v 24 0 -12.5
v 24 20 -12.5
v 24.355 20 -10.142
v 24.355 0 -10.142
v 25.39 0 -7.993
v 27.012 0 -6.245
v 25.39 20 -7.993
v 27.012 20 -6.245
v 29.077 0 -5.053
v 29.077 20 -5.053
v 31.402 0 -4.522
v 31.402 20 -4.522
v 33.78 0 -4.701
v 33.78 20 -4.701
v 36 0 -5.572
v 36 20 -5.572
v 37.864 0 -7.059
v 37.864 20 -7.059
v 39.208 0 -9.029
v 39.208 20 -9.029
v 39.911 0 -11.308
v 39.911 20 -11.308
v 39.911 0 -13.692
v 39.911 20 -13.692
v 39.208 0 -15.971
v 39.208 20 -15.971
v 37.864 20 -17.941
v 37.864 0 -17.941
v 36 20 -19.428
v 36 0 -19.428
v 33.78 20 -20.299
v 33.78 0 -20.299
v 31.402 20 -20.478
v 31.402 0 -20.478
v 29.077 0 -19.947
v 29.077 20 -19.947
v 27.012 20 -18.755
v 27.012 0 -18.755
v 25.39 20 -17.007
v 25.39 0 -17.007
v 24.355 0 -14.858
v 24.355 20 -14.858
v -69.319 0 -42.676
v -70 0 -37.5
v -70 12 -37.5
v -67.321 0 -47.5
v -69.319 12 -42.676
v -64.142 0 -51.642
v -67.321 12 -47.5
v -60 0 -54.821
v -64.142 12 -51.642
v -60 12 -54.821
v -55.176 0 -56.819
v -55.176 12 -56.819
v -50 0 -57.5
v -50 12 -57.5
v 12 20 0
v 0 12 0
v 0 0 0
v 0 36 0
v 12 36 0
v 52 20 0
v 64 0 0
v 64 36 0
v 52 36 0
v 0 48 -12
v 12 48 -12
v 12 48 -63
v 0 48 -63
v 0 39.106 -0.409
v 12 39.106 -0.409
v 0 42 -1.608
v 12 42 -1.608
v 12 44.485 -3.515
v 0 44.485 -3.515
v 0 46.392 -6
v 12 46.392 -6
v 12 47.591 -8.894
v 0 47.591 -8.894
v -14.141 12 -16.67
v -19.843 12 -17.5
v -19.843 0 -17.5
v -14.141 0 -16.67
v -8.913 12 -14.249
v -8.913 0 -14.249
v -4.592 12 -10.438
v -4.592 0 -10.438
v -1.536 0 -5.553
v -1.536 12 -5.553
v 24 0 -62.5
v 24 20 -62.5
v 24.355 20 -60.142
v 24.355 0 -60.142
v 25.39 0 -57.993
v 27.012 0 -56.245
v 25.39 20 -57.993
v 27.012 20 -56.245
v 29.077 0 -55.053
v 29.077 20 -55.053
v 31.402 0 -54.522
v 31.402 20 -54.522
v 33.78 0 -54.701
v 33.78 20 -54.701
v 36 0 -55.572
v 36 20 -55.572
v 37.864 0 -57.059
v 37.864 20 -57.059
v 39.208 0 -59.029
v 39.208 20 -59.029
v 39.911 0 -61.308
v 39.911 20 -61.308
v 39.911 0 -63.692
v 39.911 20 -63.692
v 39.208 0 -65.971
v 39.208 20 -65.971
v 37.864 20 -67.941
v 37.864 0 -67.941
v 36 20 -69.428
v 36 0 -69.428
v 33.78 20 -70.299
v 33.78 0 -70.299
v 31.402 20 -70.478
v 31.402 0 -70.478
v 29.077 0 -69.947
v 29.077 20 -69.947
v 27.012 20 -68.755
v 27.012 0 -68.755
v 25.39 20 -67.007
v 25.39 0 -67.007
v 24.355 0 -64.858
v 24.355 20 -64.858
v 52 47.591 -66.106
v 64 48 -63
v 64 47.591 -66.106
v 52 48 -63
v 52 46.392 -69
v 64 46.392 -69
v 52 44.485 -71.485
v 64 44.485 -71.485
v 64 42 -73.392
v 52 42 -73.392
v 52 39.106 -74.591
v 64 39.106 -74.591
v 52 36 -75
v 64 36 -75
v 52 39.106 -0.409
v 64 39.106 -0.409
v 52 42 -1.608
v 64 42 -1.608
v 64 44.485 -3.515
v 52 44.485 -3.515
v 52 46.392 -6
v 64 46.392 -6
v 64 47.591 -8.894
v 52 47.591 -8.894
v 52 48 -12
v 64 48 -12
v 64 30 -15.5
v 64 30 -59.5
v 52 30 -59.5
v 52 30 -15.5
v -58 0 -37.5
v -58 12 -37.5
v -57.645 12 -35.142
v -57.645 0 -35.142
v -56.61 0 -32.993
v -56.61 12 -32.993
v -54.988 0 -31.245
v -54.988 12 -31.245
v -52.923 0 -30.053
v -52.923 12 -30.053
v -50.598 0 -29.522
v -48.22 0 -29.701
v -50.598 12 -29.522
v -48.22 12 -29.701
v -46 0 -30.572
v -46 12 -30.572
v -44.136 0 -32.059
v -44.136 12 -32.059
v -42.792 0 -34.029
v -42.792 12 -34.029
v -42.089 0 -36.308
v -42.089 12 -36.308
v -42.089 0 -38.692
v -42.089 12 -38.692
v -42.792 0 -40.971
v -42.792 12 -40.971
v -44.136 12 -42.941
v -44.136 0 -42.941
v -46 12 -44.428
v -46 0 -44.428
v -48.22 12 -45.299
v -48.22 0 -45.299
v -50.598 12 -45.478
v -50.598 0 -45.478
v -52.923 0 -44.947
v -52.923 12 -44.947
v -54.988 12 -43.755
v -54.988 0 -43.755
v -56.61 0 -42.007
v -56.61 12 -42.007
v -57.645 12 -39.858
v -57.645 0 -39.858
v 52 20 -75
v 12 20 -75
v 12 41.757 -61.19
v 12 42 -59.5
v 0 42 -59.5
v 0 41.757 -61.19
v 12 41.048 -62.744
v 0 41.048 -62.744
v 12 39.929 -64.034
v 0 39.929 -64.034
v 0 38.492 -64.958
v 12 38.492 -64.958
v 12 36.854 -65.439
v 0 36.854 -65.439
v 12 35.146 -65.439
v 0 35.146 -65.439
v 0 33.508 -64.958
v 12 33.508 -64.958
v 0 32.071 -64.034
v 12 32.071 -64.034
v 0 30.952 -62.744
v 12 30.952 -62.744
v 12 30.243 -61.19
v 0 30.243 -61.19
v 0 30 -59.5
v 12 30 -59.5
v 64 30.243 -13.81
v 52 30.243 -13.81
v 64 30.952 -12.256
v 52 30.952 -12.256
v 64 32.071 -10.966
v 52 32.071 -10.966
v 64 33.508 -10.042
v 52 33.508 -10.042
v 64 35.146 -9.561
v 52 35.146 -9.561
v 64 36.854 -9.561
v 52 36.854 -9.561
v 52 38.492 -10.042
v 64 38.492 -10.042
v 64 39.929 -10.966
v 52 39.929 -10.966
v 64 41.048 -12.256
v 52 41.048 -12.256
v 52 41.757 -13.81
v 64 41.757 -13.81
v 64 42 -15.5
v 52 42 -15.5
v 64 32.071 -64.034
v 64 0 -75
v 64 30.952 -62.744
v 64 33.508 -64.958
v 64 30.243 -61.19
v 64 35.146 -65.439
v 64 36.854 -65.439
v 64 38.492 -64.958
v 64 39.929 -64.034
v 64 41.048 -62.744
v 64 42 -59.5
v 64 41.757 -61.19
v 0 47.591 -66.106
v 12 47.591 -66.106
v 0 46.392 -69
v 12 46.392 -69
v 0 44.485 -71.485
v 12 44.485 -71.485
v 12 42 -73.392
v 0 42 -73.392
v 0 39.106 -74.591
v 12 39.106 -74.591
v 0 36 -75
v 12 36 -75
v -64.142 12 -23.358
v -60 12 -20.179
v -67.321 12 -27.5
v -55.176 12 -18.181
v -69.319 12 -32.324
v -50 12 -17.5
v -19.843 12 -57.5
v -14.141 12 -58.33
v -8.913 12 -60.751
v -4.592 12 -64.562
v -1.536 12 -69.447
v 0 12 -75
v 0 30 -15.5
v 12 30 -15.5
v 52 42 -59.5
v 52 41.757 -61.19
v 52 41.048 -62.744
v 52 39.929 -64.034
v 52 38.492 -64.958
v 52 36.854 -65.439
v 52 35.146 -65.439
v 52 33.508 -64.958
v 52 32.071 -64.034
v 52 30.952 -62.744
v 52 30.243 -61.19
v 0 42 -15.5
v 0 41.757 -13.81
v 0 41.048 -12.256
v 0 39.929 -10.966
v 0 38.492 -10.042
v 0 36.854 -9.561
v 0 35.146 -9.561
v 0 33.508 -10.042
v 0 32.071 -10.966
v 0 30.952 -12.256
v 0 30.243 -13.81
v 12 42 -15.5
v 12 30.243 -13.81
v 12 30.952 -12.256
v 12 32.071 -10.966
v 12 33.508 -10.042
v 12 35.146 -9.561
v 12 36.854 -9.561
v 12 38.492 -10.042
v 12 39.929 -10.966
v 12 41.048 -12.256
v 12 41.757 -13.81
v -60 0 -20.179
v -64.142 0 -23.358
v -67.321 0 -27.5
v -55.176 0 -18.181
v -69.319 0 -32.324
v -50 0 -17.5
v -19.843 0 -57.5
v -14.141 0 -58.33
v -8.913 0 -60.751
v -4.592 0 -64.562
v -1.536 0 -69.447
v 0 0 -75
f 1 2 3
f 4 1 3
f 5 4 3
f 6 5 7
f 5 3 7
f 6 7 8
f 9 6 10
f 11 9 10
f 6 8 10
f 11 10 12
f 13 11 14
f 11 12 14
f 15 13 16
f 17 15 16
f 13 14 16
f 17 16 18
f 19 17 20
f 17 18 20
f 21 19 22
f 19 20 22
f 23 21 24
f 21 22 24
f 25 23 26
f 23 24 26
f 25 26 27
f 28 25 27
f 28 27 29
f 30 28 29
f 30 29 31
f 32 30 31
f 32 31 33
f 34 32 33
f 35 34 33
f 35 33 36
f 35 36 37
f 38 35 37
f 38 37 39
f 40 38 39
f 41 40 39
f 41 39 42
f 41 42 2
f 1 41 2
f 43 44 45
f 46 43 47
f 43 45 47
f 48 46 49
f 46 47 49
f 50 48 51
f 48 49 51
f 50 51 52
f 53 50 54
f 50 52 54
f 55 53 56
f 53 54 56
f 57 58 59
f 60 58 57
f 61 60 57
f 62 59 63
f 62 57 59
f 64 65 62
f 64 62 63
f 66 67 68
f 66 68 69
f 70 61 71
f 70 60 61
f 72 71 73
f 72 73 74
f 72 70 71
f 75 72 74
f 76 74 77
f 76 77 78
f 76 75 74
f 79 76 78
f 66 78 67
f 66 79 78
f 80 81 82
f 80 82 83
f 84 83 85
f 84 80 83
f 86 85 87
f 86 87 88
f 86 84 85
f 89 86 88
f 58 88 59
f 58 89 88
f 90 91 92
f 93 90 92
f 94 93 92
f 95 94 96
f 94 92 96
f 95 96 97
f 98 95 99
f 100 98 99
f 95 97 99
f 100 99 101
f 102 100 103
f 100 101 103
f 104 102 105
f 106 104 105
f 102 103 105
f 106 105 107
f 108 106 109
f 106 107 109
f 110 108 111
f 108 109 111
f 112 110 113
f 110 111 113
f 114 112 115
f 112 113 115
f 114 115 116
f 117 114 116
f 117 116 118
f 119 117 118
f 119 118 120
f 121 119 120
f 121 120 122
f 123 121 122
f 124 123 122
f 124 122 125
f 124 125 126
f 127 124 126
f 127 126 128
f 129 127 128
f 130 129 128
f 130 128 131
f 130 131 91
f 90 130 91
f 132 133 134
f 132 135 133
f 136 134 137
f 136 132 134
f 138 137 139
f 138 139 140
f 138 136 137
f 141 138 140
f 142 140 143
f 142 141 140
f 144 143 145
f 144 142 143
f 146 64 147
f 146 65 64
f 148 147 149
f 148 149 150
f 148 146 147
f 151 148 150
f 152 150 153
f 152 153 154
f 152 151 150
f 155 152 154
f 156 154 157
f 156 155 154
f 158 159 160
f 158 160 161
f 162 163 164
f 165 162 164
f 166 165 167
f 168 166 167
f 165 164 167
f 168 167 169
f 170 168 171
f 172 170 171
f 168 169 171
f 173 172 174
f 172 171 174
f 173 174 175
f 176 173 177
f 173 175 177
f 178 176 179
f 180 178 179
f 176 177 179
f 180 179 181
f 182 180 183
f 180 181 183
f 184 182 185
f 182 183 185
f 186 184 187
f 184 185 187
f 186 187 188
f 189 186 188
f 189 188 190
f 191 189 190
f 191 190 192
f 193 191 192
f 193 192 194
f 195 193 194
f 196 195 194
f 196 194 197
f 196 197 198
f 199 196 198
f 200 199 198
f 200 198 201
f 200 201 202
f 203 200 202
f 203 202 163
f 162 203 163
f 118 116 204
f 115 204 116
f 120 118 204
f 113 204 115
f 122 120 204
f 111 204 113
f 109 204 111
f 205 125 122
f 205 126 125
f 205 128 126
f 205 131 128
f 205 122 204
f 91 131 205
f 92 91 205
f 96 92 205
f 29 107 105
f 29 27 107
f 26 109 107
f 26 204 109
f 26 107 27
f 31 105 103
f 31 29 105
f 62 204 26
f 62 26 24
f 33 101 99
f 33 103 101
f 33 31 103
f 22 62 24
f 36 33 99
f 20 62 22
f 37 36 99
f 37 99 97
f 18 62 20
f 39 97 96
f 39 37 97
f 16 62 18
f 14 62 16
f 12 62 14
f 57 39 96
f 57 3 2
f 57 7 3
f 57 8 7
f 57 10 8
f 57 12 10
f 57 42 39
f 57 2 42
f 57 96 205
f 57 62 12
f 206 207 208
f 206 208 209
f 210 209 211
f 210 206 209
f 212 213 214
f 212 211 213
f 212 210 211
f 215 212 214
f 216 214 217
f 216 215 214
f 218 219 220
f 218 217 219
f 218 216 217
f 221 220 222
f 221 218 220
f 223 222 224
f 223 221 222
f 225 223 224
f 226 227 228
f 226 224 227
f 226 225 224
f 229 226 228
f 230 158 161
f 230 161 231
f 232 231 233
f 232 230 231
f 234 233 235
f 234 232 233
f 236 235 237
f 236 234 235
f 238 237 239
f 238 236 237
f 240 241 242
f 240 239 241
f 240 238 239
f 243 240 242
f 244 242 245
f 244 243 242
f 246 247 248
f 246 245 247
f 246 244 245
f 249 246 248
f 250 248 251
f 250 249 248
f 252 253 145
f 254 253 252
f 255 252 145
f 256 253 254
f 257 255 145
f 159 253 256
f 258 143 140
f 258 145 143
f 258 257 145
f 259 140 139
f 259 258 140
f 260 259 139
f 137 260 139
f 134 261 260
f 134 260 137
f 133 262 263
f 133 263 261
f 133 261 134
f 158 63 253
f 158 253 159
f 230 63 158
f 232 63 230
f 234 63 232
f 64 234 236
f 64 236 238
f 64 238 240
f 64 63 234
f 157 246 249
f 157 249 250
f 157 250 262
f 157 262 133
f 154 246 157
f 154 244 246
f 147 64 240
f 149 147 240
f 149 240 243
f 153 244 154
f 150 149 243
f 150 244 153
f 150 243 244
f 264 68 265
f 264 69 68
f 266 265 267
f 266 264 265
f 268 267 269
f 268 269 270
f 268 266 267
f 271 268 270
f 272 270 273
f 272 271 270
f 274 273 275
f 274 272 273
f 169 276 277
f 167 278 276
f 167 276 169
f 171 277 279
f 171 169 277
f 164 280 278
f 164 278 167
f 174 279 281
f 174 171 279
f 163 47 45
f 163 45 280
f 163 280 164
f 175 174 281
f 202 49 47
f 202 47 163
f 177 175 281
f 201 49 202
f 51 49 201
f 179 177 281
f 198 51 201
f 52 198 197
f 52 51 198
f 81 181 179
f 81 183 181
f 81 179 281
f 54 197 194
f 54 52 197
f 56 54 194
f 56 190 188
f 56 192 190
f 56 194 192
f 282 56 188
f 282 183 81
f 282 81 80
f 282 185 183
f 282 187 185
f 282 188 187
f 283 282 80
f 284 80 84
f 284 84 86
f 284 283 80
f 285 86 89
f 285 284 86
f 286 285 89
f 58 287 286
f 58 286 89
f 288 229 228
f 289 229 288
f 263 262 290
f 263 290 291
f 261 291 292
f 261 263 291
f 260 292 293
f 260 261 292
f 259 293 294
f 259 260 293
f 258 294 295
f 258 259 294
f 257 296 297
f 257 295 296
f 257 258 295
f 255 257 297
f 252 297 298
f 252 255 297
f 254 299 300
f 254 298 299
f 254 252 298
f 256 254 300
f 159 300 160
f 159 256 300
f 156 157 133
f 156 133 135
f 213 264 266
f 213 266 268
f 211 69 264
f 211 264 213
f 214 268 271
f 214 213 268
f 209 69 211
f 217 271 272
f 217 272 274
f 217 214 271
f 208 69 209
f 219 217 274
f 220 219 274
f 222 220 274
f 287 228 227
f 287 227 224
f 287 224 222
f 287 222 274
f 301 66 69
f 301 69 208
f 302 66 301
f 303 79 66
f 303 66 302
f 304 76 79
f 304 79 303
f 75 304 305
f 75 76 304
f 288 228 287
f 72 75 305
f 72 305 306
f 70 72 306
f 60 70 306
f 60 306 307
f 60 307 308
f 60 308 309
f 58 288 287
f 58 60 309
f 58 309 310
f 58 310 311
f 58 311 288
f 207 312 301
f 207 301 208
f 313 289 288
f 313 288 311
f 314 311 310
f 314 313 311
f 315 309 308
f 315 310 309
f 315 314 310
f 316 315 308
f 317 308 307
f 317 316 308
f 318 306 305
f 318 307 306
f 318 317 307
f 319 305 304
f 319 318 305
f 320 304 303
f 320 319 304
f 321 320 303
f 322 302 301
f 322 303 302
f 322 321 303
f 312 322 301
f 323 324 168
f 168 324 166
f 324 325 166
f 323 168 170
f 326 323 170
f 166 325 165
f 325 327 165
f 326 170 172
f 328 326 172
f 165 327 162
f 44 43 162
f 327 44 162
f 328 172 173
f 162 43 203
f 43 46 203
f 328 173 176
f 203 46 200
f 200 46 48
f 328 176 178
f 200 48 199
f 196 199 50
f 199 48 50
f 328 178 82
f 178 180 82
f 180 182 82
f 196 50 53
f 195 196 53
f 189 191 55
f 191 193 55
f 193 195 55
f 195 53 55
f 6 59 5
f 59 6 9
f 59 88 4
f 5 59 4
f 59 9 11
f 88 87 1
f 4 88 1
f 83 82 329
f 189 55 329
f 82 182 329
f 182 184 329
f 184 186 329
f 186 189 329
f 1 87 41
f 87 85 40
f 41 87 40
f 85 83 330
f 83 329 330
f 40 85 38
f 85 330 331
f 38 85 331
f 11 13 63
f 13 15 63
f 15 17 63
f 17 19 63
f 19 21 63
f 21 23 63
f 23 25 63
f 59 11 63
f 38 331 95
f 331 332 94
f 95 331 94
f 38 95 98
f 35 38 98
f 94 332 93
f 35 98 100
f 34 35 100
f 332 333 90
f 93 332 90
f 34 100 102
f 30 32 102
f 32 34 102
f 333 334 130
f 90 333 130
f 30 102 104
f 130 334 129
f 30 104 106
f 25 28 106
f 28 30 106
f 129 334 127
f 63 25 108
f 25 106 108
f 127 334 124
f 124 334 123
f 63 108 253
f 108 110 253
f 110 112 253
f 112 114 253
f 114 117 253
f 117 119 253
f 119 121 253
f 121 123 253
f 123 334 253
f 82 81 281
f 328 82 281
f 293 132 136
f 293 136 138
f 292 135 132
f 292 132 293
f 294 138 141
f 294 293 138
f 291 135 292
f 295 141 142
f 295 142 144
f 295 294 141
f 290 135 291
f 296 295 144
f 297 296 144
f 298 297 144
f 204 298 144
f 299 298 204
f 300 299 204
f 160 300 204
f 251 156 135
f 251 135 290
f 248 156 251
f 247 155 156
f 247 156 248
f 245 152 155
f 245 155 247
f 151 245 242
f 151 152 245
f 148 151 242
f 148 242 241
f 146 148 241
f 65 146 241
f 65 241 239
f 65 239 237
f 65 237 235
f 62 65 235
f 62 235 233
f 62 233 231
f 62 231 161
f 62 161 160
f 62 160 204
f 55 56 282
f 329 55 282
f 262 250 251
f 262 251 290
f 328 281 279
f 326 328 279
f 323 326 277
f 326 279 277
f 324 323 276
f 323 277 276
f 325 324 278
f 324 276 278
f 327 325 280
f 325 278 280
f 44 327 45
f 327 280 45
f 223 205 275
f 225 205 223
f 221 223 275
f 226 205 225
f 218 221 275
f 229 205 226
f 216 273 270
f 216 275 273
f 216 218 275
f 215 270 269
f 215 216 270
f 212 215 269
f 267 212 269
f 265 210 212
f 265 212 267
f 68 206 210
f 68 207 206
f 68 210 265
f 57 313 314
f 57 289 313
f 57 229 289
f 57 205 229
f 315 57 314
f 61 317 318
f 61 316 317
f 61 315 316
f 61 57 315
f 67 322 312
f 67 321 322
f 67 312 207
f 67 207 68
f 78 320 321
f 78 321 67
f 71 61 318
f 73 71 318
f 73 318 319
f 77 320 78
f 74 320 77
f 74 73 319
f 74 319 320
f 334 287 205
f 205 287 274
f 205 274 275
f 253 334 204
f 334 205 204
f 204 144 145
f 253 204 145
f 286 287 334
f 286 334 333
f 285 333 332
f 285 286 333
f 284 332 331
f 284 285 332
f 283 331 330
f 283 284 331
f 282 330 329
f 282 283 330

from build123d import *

# Parameters (mm, degrees)
SKETCH2_W           = 70
SKETCH2_H           = 12
BOSS_EXTRUDE2_DEPTH = 75
CUT_EXTRUDE2_DEPTH  = 75
FILLET2_R           = 20
SKETCH11_R          = 8
CUT_EXTRUDE9_DEPTH  = 20
SKETCH13_R          = 8
CUT_EXTRUDE10_DEPTH = 107.343782141
CUT_EXTRUDE11_DEPTH = 161.888159912
FILLET3_R           = 12


with BuildPart() as part:
    # Sketch2 → Boss-Extrude2 (new body)
    with BuildSketch(Plane.XY):
        Polygon((12, 48), (0, 48), (0, 0), (64, 0), (64, 48), (52, 48), (52, 20), (12, 20), align=None)
        with Locations((-35, 6)):
            Rectangle(SKETCH2_W, SKETCH2_H)
    extrude(amount=-BOSS_EXTRUDE2_DEPTH)

    # Sketch4 → Cut-Extrude2 (cut)
    with BuildSketch(Plane(origin=(0, 12, 0), x_dir=(1, 0, 0), z_dir=(0, 1, 0))):
        with BuildLine():
            ThreePointArc((-70, 37.5), (-64.142135624, 51.642135624), (-50, 57.5))
            Line((-50, 57.5), (0, 57.5))
            Line((0, 57.5), (0, 75))
            Line((0, 75), (-70, 75))
            Line((-70, 75), (-70, 37.5))
        make_face()
        with BuildLine():
            ThreePointArc((-50, 17.5), (-64.142135624, 23.357864376), (-70, 37.5))
            Line((-70, 37.5), (-70, 0))
            Line((-70, 0), (0, 0))
            Line((0, 0), (0, 17.5))
            Line((0, 17.5), (-50, 17.5))
        make_face()
    extrude(amount=-CUT_EXTRUDE2_DEPTH, mode=Mode.SUBTRACT)

    # Fillet2
    # the kernel refuses this fillet: 20 mm, written as the material it adds along each edge
    with BuildSketch(Plane(origin=(0, 12, -57.5), x_dir=(-1, 0, 0), z_dir=(0, -1, 0))) as fillet2_piece_1:
        with BuildLine():
            CenterArc((19.843134833, 20), FILLET2_R, 187.180755781, 82.819244219)
            Line((0, 17.5), (-0.396862697, 17.45))
            ThreePointArc((-0.396862697, 17.45), (-0.4, 8.75), (-0.4, 0))
            Line((-0.4, 0), (0, -0.4))
            Line((0, -0.4), (19.843134833, -0.4))
            Line((19.843134833, -0.4), (19.843134833, 0))
        make_face()
    extrude(amount=12)
    with BuildSketch(Plane(origin=(0, 12, -17.5), x_dir=(-1, 0, 0), z_dir=(0, -1, 0))) as fillet2_piece_2:
        with BuildLine():
            CenterArc((19.843134833, -20), FILLET2_R, 90, 82.819244219)
            Line((0, -17.5), (-0.396862697, -17.45))
            ThreePointArc((-0.396862697, -17.45), (-0.4, -8.75), (-0.4, 0))
            Line((-0.4, 0), (0, 0.4))
            Line((0, 0.4), (19.843134833, 0.4))
            Line((19.843134833, 0.4), (19.843134833, 0))
        make_face()
    extrude(amount=12)

    # Sketch11 → Cut-Extrude9 (cut)
    with BuildSketch(Plane(origin=(0, 12, 0), x_dir=(1, 0, 0), z_dir=(0, 1, 0))):
        with Locations(Location((-50, 37.5, 0), (0, 0, 180))):
            Circle(SKETCH11_R)
    extrude(amount=-CUT_EXTRUDE9_DEPTH, mode=Mode.SUBTRACT)

    # Sketch13 → Cut-Extrude10 (cut, through all)
    with BuildSketch(Plane(origin=(0, 20, 0), x_dir=(1, 0, 0), z_dir=(0, 1, 0))):
        with Locations(Location((32, 62.5, 0), (0, 0, 180))):
            Circle(SKETCH13_R)
        with Locations(Location((32, 12.5, 0), (0, 0, 180))):
            Circle(SKETCH13_R)
    extrude(amount=-CUT_EXTRUDE10_DEPTH, mode=Mode.SUBTRACT)

    # Sketch14 → Cut-Extrude11 (cut, through all)
    with BuildSketch(Plane(origin=(64, 0, 0), x_dir=(0, 0, -1), z_dir=(1, 0, 0))):
        with BuildLine():
            Line((15.5, 42), (59.5, 42))
            ThreePointArc((59.5, 42), (65.5, 36), (59.5, 30))
            Line((59.5, 30), (15.5, 30))
            ThreePointArc((15.5, 30), (9.5, 36), (15.5, 42))
        make_face()
    extrude(amount=-CUT_EXTRUDE11_DEPTH, mode=Mode.SUBTRACT)

    # Fillet3
    fillet3_edges = [part.edges().sort_by_distance(p)[0] for p in [
        (58, 48, 0),
        (6, 48, 0),
        (6, 48, -75),
        (58, 48, -75),
    ]]
    fillet(fillet3_edges, radius=FILLET3_R)


solid = part.part
